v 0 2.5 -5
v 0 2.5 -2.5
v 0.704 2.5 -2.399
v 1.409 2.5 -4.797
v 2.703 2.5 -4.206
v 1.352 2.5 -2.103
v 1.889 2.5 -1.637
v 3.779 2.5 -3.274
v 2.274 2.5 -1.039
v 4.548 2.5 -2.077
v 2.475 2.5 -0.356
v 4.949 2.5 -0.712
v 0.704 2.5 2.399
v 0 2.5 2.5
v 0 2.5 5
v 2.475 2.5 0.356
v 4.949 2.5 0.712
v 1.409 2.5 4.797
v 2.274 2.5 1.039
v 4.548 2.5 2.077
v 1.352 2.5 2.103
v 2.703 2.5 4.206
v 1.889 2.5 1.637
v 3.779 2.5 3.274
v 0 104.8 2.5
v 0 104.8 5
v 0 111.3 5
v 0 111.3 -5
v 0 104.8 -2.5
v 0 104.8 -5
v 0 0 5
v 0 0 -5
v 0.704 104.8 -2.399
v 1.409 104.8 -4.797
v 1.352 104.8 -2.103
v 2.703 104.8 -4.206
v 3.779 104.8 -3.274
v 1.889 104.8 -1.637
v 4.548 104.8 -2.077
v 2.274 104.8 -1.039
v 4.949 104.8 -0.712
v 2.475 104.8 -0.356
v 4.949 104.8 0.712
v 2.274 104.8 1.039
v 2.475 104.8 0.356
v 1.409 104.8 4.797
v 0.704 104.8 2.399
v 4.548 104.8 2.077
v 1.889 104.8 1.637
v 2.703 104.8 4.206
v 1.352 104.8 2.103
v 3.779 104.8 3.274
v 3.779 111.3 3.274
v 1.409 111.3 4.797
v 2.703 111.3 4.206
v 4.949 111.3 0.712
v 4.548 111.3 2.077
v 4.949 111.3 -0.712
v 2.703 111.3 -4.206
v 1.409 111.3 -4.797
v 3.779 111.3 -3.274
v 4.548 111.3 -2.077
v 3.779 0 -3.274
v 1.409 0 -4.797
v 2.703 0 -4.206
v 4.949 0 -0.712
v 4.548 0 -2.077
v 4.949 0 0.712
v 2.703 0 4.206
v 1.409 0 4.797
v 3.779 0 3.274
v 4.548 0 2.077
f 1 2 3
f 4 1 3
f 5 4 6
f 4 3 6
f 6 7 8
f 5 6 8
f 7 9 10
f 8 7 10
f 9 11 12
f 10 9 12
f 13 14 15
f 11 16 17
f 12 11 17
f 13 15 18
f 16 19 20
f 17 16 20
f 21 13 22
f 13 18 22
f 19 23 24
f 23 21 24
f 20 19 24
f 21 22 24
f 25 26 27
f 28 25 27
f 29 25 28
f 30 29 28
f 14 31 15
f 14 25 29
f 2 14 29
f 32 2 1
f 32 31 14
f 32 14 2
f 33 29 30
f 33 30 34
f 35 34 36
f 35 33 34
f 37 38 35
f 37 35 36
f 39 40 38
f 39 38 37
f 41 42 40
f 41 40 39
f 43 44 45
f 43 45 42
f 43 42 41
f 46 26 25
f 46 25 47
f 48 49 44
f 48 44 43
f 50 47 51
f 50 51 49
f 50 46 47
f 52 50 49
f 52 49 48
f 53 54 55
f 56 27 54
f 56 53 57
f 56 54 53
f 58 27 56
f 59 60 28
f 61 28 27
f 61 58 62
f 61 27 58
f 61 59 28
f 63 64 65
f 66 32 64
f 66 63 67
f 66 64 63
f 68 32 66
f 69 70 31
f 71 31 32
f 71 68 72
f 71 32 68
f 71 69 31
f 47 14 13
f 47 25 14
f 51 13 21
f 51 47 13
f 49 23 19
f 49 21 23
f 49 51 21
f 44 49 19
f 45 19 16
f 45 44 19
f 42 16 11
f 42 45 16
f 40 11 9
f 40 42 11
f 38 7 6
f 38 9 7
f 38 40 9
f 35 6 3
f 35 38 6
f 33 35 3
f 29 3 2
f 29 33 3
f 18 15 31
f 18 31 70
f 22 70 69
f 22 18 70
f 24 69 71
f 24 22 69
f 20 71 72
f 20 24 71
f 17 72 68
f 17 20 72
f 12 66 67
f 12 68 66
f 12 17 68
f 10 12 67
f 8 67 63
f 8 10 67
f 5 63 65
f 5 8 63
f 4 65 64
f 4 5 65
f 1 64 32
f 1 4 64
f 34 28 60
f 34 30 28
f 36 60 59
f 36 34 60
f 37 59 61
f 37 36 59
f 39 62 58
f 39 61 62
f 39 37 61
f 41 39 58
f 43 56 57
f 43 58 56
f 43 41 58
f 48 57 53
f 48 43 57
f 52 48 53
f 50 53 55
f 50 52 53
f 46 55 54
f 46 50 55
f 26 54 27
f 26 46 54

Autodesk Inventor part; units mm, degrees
ref_plane "YZ Plane" through (0, 0, 0) normal (1, 0, 0) x (0, 1, 0)
ref_plane "XZ Plane" through (0, 0, 0) normal (0, 1, 0) x (-1, 0, 0)
ref_plane "XY Plane" through (0, 0, 0) normal (0, 0, 1) x (1, 0, 0)
sketch "Sketch1" plane through (0, 0, 0) normal (0, 0, 1) x (1, 0, 0)
  line L0 (0, 0) -> (2.5, 0)
  line L1 (2.5, 0) -> (2.5, 107.3)
  line L2 (2.5, 107.3) -> (0, 107.3)
  line L3 (0, 107.3) -> (0, 0)
  line L4 (0, 107.3) -> (5, 107.3)
  line L5 (5, 107.3) -> (5, 104.8)
  line L6 (5, 104.8) -> (0, 104.8)
  line L7 (0, 104.8) -> (0, 107.3)
  line L8 (0, 0) -> (5, 0)
  line L9 (5, 0) -> (5, 2.5)
  line L10 (5, 2.5) -> (0, 2.5)
  line L11 (0, 2.5) -> (0, 0)
  point P0 (2.5, 2.5)
  point P1 (2.5, 104.8)
  dimension "d0" = 2.5
  dimension "d1" = 107.3
  dimension "d2" = 5
  dimension "d3" = 2.5
  dimension "d4" = 5
  dimension "d5" = 2.5
revolve "Revolution1" add sketch "Sketch1" angle 360 about axis through (0, 107.3, 0) along (0, -1, 0)
sketch "Sketch4" plane through (0, 107.3, 0) normal (0, 1, 0) x (1, 0, 0)
  circle A0 centre (0, 0) radius 5 projected
  line L0 (0, -5) -> (0, 5)
  arc A1 (0, 5) -> (0, -5) centre (0, 0) ccw
extrude "Extrusion3" cut sketch "Sketch4" against normal through all contours L0 A0 picked at (-0.7745, -1.4758)
sketch "Sketch5" plane through (0, 107.3, 0) normal (0, 1, 0) x (1, 0, 0)
  arc A0 (0, -5) -> (0, 5) centre (0, 0) ccw
  line L0 (0, -5) -> (0, 5)
extrude "Extrusion4" add sketch "Sketch5" along normal blind 4
properties part number "Rod"
